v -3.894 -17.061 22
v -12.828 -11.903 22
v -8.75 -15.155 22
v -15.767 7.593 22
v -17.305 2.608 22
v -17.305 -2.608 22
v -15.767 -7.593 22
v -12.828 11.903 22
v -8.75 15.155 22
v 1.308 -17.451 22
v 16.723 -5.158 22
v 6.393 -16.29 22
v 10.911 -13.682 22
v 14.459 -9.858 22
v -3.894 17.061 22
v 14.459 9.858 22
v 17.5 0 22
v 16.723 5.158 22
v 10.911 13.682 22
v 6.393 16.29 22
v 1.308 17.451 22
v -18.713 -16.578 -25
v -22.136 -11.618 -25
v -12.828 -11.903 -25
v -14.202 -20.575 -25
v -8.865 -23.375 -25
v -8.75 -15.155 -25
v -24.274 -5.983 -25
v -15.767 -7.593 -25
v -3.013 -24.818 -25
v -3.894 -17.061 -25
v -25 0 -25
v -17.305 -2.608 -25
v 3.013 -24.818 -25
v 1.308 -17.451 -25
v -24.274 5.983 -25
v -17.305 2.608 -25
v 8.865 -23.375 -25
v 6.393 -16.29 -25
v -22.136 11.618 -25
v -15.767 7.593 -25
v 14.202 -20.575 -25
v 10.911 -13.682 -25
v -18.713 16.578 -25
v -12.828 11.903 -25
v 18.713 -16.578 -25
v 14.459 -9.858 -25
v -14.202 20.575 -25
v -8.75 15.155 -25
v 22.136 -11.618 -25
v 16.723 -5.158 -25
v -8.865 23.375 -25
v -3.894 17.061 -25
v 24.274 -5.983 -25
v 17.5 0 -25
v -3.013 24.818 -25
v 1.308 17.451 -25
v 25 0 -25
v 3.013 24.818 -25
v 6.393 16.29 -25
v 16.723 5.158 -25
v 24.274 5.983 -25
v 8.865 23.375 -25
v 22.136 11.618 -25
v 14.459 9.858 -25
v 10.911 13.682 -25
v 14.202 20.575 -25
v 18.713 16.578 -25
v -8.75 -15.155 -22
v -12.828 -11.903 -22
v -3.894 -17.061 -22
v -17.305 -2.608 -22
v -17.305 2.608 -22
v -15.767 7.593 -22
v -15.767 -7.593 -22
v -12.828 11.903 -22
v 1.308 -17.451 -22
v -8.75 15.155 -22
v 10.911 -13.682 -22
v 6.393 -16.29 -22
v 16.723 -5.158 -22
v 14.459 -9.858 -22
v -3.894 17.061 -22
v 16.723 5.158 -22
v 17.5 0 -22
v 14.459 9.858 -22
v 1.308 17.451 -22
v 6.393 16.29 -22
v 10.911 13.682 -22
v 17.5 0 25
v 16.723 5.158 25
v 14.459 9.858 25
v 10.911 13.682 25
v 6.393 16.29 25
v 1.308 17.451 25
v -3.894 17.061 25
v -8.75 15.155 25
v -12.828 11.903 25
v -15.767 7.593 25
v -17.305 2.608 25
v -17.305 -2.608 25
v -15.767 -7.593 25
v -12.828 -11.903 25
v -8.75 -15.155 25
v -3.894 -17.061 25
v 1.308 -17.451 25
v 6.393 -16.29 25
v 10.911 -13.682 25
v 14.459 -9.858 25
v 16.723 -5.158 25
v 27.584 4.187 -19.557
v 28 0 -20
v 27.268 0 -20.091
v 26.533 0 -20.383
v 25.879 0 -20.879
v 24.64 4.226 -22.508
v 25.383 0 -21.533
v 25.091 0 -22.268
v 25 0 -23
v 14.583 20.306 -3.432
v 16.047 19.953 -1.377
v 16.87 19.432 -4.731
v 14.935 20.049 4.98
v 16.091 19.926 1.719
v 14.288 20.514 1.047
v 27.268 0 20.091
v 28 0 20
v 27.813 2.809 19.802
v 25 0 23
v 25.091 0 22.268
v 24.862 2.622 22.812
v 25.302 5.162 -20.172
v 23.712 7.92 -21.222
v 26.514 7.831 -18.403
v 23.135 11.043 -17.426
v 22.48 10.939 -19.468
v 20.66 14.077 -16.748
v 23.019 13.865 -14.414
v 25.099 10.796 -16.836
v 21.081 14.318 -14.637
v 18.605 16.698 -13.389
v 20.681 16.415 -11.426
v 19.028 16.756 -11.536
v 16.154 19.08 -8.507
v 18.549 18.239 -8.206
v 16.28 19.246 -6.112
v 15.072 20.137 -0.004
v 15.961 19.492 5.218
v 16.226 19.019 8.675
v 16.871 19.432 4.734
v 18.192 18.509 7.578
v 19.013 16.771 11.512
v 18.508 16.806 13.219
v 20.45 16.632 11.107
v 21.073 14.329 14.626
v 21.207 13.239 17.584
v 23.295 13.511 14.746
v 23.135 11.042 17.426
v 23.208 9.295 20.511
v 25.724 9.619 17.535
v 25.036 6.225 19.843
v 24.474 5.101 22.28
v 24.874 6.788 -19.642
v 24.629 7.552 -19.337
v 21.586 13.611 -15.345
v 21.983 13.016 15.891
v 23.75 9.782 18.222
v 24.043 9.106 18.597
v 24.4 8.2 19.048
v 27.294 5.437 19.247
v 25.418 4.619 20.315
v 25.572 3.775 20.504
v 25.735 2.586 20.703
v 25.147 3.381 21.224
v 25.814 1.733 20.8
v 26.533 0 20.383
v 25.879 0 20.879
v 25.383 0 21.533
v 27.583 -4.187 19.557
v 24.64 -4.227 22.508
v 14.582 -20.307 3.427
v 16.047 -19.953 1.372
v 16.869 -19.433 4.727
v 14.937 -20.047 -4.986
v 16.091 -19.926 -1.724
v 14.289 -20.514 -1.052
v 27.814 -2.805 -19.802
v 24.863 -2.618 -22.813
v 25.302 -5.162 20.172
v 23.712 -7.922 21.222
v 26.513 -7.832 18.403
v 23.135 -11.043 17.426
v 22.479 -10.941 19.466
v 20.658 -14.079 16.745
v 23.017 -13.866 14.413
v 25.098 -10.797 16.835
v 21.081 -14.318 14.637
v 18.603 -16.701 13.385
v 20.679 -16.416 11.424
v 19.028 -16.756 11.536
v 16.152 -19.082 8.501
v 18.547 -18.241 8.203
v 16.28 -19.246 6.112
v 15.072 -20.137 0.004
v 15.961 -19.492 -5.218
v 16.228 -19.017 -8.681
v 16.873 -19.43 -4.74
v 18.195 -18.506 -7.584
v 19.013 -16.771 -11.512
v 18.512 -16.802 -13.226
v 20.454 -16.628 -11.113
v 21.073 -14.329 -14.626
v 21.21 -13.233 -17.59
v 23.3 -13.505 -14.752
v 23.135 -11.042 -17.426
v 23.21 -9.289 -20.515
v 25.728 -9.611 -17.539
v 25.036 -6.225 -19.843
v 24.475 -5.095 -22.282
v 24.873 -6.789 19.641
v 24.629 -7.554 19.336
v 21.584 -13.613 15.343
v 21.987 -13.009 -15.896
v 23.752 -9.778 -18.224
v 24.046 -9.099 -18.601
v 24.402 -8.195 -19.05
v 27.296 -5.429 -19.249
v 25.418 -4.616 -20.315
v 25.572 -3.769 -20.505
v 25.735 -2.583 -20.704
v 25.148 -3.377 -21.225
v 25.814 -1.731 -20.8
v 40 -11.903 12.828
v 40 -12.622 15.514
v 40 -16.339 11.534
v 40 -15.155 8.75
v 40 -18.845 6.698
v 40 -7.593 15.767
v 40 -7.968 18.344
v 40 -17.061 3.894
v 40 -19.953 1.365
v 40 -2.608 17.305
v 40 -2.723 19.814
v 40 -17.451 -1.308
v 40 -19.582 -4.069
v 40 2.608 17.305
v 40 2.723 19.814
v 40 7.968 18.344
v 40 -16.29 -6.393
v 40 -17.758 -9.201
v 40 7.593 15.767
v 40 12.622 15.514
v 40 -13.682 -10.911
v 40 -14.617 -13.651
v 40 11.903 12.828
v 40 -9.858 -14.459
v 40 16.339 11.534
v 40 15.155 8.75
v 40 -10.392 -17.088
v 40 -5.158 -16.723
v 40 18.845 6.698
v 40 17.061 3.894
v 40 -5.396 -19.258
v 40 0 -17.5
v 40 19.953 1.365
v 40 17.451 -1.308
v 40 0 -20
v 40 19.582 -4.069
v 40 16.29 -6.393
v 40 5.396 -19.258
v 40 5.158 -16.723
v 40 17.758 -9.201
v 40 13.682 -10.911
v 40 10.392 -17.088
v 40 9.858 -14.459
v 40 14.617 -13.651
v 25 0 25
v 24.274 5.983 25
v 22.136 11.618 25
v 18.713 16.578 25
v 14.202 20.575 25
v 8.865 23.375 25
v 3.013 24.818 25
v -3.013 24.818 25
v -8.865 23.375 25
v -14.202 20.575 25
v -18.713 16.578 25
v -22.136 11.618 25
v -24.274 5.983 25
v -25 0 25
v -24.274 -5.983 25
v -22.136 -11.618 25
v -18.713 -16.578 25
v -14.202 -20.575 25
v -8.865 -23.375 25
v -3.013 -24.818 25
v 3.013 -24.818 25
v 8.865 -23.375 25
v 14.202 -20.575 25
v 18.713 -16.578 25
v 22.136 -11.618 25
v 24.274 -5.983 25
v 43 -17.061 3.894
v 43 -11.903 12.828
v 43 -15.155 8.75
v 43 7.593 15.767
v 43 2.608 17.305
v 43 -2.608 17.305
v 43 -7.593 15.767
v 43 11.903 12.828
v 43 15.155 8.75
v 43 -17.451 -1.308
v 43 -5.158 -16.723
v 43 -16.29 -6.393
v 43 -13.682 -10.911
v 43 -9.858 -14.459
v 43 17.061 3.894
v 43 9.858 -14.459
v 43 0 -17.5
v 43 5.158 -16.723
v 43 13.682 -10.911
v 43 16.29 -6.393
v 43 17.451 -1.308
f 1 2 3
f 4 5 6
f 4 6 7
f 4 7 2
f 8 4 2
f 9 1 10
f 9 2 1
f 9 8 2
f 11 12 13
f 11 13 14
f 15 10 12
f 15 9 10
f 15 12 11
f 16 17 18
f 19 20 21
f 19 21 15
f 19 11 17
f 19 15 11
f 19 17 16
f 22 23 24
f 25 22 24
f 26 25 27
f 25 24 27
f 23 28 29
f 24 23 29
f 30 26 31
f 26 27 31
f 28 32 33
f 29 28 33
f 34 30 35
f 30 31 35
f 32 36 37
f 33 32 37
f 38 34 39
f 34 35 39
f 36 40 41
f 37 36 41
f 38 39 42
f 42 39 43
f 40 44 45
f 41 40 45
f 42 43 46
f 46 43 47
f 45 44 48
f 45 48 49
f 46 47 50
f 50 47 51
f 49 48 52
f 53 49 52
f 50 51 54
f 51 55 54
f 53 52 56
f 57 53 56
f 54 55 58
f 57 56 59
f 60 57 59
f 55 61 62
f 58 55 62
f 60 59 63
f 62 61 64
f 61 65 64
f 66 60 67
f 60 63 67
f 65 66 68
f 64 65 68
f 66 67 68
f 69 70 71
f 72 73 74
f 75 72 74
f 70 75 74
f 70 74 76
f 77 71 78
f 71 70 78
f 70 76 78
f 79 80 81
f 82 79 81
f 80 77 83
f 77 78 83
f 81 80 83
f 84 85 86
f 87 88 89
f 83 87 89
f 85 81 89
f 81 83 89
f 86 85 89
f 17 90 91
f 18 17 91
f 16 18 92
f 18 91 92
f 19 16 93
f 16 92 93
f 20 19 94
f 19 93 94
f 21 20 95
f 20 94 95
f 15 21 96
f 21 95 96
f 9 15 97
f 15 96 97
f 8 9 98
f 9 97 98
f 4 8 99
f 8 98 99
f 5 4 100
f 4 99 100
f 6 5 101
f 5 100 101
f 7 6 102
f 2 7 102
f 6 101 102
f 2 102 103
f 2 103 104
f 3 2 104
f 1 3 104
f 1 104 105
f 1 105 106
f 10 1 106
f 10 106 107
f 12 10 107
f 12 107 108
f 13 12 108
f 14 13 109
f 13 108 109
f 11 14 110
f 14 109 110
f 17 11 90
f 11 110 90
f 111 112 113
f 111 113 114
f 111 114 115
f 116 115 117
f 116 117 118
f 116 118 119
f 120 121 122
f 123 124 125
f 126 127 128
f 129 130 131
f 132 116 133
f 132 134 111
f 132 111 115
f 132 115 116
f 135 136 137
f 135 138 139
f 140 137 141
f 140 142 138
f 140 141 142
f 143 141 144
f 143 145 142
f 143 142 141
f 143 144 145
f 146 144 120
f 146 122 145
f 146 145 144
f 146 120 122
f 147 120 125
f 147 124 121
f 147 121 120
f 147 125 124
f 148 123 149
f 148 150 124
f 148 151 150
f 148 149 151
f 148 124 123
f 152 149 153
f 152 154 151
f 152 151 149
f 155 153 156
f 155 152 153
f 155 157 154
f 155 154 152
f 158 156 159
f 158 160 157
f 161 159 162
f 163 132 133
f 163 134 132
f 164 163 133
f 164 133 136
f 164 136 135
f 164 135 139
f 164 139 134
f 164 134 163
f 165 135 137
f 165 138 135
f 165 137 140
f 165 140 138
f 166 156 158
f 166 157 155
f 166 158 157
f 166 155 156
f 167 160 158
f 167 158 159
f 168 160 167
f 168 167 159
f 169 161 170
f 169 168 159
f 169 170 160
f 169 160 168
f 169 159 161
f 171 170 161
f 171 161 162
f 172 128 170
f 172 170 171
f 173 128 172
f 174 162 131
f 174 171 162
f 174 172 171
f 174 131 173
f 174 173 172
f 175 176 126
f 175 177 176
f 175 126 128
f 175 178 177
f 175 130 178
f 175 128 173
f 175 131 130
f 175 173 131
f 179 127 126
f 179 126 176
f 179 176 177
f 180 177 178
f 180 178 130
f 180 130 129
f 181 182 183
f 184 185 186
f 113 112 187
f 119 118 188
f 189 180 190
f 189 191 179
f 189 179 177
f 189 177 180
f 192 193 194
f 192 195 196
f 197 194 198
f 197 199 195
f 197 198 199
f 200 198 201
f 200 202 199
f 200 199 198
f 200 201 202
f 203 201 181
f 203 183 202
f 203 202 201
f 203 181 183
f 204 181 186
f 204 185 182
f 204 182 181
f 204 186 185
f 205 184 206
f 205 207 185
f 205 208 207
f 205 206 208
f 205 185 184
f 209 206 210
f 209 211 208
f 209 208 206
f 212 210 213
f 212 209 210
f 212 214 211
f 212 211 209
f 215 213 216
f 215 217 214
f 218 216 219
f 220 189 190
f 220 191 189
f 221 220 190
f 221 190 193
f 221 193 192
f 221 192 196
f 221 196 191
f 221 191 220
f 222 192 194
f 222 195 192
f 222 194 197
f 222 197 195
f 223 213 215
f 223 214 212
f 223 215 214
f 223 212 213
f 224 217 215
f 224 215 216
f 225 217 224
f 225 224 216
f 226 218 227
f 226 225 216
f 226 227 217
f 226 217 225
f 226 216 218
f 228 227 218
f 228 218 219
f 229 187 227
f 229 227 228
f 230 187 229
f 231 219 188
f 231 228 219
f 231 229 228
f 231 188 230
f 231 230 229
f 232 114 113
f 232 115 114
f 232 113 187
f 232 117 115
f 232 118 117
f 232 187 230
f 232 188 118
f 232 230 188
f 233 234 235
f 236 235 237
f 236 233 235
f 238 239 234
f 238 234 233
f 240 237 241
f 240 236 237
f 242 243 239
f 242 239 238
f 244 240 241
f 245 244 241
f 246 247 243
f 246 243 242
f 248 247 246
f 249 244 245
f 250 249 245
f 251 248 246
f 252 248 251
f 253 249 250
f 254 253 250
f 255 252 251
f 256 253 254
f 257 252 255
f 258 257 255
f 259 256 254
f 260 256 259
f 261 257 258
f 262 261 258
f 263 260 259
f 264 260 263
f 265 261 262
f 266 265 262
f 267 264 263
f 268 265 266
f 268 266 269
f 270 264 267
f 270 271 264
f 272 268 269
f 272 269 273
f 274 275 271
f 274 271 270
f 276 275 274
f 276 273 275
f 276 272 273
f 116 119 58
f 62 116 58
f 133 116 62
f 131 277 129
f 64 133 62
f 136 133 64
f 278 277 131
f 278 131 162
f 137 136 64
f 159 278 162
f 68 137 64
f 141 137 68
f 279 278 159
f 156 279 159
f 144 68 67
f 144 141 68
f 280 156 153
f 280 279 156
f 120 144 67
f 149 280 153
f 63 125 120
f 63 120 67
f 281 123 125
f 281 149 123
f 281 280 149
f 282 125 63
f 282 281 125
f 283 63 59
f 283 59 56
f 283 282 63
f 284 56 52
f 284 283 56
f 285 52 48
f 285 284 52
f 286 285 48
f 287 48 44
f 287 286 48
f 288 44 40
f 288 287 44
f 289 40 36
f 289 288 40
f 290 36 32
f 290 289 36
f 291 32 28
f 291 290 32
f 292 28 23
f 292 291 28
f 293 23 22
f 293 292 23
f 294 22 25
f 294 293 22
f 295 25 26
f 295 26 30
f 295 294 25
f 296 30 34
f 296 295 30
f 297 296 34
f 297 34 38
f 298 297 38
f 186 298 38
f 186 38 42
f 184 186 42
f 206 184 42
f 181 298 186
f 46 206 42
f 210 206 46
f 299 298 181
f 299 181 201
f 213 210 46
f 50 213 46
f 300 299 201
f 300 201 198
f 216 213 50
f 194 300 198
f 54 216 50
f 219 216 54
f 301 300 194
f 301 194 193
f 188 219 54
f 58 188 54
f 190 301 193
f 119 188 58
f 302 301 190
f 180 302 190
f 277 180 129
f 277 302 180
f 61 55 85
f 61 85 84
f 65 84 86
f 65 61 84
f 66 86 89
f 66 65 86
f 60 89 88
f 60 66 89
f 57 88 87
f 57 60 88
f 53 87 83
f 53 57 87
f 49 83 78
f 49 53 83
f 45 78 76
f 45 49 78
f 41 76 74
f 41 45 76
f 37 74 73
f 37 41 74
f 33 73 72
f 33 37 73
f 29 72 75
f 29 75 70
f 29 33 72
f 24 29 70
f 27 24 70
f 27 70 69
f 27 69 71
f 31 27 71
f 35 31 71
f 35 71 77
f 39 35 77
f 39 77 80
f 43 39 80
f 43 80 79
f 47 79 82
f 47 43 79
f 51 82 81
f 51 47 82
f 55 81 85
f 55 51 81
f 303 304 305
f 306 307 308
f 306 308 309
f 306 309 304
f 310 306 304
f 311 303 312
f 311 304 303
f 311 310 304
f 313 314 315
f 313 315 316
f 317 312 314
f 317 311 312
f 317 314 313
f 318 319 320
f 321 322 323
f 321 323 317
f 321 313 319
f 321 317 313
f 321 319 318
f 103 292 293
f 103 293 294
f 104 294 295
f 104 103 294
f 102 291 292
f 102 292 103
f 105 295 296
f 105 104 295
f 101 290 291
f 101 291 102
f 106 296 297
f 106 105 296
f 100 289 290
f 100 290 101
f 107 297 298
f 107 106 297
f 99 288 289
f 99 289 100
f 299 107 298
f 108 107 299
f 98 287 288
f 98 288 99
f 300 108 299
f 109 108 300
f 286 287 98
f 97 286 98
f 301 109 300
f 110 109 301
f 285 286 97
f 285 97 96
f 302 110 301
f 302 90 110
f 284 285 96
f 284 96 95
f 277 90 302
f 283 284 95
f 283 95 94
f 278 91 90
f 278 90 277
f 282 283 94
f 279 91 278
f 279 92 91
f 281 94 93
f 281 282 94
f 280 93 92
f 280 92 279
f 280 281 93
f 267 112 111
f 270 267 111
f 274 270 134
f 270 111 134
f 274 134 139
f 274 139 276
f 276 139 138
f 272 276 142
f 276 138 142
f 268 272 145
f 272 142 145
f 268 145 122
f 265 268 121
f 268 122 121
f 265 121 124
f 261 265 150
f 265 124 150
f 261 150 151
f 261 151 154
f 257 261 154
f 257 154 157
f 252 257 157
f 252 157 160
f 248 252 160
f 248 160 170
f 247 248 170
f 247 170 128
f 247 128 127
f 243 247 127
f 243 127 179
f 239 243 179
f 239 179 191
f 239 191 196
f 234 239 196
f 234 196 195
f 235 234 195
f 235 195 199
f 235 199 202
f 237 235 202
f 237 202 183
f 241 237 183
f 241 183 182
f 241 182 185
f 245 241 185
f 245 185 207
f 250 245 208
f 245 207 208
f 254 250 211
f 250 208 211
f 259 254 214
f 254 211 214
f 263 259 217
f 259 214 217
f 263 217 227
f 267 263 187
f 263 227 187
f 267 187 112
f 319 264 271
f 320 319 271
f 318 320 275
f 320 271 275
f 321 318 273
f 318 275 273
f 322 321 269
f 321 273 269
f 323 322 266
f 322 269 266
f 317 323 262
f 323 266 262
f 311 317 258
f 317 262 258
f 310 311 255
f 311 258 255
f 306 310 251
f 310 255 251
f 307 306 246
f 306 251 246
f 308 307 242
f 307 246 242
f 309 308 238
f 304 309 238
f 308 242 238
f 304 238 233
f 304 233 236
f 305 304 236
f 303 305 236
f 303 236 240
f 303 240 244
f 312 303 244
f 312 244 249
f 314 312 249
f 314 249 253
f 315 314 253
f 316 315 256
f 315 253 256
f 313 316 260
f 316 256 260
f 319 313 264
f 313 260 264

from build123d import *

# Parameters (mm, degrees)
SKETCH1_R           = 25
BOSS_EXTRUDE1_DEPTH = 25
SKETCH2_R           = 17.5
CUT_EXTRUDE1_DEPTH  = 3
SKETCH3_R           = 20
BOSS_EXTRUDE2_DEPTH = 40
SKETCH4_R           = 17.5
BOSS_EXTRUDE3_DEPTH = 3
FILLET1_R           = 3


with BuildPart() as part:
    # Sketch1 → Boss-Extrude1 (new body, symmetric)
    with BuildSketch(Plane.XY):
        Circle(SKETCH1_R)
    extrude(amount=BOSS_EXTRUDE1_DEPTH, both=True)

    # Sketch2 → Cut-Extrude1 (cut)
    with BuildSketch(Plane.XY.offset(25)):
        Circle(SKETCH2_R)
    cut_extrude1 = extrude(amount=-CUT_EXTRUDE1_DEPTH, mode=Mode.SUBTRACT)

    # Mirror1: Cut-Extrude1 across plane
    add(cut_extrude1.mirror(Plane.XY), mode=Mode.SUBTRACT)

    # Sketch3 → Boss-Extrude2 (add)
    with BuildSketch(Plane(origin=(0, 0, 0), x_dir=(0, 0, -1), z_dir=(1, 0, 0))):
        Circle(SKETCH3_R)
    extrude(amount=BOSS_EXTRUDE2_DEPTH)

    # Sketch4 → Boss-Extrude3 (add)
    with BuildSketch(Plane(origin=(40, 0, 0), x_dir=(0, 0, -1), z_dir=(1, 0, 0))):
        Circle(SKETCH4_R)
    extrude(amount=BOSS_EXTRUDE3_DEPTH)

    # Fillet1
    fillet1_edges = [part.edges().sort_by_distance(p)[0] for p in [
        (15, 20, 0),
    ]]
    fillet(fillet1_edges, radius=FILLET1_R)


solid = part.part
